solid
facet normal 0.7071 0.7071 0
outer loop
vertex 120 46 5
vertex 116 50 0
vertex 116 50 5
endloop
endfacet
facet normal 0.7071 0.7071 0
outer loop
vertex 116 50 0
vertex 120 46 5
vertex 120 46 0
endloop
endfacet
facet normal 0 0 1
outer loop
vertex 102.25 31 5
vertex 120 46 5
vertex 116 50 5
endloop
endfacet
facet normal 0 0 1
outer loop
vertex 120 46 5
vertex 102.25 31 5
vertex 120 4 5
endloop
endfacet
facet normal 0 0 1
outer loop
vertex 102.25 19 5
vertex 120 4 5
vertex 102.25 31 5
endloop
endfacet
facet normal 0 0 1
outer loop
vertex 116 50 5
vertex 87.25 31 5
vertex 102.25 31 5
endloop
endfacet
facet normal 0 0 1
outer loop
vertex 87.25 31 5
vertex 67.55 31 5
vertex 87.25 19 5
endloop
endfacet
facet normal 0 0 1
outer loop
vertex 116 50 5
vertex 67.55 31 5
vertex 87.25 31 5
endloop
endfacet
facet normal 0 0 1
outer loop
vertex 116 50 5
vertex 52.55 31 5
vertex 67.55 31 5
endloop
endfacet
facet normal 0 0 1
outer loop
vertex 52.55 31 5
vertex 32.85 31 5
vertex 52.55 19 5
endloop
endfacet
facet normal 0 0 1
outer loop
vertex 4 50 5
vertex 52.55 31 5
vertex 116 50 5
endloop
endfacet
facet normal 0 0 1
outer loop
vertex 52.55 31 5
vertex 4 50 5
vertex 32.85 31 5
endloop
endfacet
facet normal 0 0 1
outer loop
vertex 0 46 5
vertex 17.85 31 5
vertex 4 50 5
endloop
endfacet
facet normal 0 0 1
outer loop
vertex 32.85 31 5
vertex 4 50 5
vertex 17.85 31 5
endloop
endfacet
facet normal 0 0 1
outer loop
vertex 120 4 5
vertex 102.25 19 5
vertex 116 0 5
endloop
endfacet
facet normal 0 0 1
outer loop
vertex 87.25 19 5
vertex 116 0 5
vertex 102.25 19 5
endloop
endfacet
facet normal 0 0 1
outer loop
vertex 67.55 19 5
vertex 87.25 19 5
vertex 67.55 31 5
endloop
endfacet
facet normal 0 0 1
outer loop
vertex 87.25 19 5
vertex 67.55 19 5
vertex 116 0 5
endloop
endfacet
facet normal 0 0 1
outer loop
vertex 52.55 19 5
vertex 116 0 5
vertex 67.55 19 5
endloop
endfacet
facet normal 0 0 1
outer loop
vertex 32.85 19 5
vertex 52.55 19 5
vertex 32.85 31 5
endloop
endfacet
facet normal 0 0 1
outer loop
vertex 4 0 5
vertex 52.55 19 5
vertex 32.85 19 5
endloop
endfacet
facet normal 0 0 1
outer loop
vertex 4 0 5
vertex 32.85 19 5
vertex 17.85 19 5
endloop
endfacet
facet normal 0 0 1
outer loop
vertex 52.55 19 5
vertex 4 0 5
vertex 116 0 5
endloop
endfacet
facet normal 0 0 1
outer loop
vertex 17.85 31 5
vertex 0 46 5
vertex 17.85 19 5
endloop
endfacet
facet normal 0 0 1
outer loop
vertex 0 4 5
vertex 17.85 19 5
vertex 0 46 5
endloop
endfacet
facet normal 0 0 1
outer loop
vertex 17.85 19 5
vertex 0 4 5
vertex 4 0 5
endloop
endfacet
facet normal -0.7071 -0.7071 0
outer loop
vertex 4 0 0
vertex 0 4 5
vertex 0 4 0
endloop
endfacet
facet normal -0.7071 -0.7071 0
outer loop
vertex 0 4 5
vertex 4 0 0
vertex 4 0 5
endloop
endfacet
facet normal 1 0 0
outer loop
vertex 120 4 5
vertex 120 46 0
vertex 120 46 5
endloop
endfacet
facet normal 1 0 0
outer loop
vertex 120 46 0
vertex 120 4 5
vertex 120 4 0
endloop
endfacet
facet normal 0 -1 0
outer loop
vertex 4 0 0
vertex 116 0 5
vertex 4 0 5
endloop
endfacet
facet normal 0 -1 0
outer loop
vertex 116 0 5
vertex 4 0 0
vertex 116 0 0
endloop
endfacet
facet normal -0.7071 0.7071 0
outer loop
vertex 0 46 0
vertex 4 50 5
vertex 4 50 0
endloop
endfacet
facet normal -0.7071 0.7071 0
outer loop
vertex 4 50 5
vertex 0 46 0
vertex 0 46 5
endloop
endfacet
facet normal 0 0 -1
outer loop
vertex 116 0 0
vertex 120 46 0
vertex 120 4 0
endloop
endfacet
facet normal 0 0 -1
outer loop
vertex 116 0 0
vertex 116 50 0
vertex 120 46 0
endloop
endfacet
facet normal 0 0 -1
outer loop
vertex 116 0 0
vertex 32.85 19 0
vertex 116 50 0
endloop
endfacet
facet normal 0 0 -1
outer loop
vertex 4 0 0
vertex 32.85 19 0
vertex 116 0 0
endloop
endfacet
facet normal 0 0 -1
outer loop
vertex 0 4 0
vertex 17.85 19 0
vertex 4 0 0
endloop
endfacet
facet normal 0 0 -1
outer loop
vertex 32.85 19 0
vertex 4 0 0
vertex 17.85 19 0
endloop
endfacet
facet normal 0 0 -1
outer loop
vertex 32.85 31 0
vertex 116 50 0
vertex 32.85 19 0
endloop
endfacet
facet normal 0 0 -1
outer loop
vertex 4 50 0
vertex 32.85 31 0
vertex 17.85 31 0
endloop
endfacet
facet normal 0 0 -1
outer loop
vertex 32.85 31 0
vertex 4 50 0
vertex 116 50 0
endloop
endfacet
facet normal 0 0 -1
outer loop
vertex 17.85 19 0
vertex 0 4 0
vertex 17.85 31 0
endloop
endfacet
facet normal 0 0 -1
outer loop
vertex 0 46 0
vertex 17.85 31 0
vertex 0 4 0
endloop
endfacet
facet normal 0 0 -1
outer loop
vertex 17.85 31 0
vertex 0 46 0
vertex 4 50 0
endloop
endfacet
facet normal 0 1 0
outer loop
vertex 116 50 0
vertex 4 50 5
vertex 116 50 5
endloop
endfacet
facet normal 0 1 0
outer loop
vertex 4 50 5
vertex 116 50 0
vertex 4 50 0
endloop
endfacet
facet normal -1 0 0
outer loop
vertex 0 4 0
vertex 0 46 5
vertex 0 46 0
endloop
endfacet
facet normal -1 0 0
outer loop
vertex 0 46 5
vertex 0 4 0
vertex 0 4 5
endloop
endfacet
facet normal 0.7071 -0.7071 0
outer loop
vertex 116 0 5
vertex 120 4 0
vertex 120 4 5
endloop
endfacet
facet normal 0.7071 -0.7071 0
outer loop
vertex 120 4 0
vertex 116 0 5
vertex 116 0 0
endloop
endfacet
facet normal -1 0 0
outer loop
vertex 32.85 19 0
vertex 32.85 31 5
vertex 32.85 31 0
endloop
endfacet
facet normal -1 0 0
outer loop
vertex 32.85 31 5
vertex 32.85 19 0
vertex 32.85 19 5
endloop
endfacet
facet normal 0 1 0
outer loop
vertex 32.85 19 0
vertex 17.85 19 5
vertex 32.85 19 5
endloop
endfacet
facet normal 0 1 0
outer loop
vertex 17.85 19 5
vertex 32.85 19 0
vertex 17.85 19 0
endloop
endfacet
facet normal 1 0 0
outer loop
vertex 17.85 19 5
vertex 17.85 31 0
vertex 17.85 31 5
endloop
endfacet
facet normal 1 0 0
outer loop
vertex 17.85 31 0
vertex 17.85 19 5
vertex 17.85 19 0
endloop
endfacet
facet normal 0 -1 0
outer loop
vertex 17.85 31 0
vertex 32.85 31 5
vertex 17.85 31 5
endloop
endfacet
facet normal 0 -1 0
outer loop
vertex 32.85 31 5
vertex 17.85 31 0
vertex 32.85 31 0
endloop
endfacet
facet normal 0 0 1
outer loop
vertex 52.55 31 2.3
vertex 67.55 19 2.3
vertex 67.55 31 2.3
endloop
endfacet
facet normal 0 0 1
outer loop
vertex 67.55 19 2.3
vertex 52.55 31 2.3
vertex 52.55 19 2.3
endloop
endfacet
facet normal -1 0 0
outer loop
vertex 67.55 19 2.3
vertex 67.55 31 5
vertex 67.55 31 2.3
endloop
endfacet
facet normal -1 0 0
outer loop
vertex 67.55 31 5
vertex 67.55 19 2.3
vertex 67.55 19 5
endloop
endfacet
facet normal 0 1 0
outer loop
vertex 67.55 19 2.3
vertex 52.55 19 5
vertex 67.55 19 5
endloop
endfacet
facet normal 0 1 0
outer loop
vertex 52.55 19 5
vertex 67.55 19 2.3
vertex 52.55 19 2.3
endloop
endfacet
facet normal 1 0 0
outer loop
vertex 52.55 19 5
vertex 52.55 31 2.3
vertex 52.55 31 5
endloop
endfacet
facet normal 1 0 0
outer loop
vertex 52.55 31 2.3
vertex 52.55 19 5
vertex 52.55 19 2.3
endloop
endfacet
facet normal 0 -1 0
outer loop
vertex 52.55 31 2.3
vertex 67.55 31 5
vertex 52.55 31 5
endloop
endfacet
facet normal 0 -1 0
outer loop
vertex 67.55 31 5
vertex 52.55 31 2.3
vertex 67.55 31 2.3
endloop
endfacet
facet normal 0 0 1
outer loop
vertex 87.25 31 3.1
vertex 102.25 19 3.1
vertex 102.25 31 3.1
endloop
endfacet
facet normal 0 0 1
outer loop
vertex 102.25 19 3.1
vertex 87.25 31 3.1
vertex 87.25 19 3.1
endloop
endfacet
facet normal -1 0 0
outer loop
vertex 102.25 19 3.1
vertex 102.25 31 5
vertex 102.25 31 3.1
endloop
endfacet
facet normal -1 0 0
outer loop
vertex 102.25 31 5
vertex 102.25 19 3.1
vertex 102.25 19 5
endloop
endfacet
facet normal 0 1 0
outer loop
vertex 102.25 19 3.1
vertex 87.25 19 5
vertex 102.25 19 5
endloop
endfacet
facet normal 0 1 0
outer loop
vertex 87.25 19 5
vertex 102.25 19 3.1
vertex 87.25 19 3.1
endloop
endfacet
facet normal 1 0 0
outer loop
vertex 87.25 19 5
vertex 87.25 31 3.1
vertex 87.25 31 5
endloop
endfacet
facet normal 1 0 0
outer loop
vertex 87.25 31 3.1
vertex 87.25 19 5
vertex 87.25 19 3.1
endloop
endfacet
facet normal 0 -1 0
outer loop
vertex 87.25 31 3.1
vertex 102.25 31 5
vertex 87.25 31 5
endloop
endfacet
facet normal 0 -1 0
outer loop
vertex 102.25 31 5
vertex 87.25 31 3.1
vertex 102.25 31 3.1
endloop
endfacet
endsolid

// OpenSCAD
$fn = 32;

// ----------------------------------------------------------------------
// Windowed plate: 3 voids, 120 x 50 x 5 mm
// ----------------------------------------------------------------------

// --- parameters (mm) ---
plate_l = 120;            // plate length, X
plate_w = 50;             // plate width, Y
plate_t = 5;              // plate thickness, Z
edge_margin = 8;          // wall from the plate edge to any window
windows = 3;              // number of windows in the row
win_l = 15;               // window length
win_w = 12;               // window width
win_pitch = 34.7;         // window pitch along X
depth_1 = 5;              // depth of void 1 (full thickness = through)
depth_2 = 2.7;            // depth of void 2 (full thickness = through)
depth_3 = 1.9;            // depth of void 3 (full thickness = through)
corner_c = 4;             // corner chamfer of the plate

profile = [[4, 0], [116, 0], [120, 4], [120, 46], [116, 50], [4, 50], [0, 46], [0, 4]];  // primary outline, 8 points, counter clockwise
void_1 = [[17.85, 19], [32.85, 19], [32.85, 31], [17.85, 31]];  // window 1 of the row, 4 points
void_2 = [[52.55, 19], [67.55, 19], [67.55, 31], [52.55, 31]];  // window 2 of the row, 4 points
void_3 = [[87.25, 19], [102.25, 19], [102.25, 31], [87.25, 31]];  // window 3 of the row, 4 points

// --- the one profile operation ---
difference() {
  linear_extrude(height = plate_t) polygon(points = profile);
  translate([0, 0, -1])
    linear_extrude(height = plate_t + 2) polygon(points = void_1);
  translate([0, 0, plate_t - depth_2])
    linear_extrude(height = depth_2 + 1) polygon(points = void_2);
  translate([0, 0, plate_t - depth_3])
    linear_extrude(height = depth_3 + 1) polygon(points = void_3);
}
